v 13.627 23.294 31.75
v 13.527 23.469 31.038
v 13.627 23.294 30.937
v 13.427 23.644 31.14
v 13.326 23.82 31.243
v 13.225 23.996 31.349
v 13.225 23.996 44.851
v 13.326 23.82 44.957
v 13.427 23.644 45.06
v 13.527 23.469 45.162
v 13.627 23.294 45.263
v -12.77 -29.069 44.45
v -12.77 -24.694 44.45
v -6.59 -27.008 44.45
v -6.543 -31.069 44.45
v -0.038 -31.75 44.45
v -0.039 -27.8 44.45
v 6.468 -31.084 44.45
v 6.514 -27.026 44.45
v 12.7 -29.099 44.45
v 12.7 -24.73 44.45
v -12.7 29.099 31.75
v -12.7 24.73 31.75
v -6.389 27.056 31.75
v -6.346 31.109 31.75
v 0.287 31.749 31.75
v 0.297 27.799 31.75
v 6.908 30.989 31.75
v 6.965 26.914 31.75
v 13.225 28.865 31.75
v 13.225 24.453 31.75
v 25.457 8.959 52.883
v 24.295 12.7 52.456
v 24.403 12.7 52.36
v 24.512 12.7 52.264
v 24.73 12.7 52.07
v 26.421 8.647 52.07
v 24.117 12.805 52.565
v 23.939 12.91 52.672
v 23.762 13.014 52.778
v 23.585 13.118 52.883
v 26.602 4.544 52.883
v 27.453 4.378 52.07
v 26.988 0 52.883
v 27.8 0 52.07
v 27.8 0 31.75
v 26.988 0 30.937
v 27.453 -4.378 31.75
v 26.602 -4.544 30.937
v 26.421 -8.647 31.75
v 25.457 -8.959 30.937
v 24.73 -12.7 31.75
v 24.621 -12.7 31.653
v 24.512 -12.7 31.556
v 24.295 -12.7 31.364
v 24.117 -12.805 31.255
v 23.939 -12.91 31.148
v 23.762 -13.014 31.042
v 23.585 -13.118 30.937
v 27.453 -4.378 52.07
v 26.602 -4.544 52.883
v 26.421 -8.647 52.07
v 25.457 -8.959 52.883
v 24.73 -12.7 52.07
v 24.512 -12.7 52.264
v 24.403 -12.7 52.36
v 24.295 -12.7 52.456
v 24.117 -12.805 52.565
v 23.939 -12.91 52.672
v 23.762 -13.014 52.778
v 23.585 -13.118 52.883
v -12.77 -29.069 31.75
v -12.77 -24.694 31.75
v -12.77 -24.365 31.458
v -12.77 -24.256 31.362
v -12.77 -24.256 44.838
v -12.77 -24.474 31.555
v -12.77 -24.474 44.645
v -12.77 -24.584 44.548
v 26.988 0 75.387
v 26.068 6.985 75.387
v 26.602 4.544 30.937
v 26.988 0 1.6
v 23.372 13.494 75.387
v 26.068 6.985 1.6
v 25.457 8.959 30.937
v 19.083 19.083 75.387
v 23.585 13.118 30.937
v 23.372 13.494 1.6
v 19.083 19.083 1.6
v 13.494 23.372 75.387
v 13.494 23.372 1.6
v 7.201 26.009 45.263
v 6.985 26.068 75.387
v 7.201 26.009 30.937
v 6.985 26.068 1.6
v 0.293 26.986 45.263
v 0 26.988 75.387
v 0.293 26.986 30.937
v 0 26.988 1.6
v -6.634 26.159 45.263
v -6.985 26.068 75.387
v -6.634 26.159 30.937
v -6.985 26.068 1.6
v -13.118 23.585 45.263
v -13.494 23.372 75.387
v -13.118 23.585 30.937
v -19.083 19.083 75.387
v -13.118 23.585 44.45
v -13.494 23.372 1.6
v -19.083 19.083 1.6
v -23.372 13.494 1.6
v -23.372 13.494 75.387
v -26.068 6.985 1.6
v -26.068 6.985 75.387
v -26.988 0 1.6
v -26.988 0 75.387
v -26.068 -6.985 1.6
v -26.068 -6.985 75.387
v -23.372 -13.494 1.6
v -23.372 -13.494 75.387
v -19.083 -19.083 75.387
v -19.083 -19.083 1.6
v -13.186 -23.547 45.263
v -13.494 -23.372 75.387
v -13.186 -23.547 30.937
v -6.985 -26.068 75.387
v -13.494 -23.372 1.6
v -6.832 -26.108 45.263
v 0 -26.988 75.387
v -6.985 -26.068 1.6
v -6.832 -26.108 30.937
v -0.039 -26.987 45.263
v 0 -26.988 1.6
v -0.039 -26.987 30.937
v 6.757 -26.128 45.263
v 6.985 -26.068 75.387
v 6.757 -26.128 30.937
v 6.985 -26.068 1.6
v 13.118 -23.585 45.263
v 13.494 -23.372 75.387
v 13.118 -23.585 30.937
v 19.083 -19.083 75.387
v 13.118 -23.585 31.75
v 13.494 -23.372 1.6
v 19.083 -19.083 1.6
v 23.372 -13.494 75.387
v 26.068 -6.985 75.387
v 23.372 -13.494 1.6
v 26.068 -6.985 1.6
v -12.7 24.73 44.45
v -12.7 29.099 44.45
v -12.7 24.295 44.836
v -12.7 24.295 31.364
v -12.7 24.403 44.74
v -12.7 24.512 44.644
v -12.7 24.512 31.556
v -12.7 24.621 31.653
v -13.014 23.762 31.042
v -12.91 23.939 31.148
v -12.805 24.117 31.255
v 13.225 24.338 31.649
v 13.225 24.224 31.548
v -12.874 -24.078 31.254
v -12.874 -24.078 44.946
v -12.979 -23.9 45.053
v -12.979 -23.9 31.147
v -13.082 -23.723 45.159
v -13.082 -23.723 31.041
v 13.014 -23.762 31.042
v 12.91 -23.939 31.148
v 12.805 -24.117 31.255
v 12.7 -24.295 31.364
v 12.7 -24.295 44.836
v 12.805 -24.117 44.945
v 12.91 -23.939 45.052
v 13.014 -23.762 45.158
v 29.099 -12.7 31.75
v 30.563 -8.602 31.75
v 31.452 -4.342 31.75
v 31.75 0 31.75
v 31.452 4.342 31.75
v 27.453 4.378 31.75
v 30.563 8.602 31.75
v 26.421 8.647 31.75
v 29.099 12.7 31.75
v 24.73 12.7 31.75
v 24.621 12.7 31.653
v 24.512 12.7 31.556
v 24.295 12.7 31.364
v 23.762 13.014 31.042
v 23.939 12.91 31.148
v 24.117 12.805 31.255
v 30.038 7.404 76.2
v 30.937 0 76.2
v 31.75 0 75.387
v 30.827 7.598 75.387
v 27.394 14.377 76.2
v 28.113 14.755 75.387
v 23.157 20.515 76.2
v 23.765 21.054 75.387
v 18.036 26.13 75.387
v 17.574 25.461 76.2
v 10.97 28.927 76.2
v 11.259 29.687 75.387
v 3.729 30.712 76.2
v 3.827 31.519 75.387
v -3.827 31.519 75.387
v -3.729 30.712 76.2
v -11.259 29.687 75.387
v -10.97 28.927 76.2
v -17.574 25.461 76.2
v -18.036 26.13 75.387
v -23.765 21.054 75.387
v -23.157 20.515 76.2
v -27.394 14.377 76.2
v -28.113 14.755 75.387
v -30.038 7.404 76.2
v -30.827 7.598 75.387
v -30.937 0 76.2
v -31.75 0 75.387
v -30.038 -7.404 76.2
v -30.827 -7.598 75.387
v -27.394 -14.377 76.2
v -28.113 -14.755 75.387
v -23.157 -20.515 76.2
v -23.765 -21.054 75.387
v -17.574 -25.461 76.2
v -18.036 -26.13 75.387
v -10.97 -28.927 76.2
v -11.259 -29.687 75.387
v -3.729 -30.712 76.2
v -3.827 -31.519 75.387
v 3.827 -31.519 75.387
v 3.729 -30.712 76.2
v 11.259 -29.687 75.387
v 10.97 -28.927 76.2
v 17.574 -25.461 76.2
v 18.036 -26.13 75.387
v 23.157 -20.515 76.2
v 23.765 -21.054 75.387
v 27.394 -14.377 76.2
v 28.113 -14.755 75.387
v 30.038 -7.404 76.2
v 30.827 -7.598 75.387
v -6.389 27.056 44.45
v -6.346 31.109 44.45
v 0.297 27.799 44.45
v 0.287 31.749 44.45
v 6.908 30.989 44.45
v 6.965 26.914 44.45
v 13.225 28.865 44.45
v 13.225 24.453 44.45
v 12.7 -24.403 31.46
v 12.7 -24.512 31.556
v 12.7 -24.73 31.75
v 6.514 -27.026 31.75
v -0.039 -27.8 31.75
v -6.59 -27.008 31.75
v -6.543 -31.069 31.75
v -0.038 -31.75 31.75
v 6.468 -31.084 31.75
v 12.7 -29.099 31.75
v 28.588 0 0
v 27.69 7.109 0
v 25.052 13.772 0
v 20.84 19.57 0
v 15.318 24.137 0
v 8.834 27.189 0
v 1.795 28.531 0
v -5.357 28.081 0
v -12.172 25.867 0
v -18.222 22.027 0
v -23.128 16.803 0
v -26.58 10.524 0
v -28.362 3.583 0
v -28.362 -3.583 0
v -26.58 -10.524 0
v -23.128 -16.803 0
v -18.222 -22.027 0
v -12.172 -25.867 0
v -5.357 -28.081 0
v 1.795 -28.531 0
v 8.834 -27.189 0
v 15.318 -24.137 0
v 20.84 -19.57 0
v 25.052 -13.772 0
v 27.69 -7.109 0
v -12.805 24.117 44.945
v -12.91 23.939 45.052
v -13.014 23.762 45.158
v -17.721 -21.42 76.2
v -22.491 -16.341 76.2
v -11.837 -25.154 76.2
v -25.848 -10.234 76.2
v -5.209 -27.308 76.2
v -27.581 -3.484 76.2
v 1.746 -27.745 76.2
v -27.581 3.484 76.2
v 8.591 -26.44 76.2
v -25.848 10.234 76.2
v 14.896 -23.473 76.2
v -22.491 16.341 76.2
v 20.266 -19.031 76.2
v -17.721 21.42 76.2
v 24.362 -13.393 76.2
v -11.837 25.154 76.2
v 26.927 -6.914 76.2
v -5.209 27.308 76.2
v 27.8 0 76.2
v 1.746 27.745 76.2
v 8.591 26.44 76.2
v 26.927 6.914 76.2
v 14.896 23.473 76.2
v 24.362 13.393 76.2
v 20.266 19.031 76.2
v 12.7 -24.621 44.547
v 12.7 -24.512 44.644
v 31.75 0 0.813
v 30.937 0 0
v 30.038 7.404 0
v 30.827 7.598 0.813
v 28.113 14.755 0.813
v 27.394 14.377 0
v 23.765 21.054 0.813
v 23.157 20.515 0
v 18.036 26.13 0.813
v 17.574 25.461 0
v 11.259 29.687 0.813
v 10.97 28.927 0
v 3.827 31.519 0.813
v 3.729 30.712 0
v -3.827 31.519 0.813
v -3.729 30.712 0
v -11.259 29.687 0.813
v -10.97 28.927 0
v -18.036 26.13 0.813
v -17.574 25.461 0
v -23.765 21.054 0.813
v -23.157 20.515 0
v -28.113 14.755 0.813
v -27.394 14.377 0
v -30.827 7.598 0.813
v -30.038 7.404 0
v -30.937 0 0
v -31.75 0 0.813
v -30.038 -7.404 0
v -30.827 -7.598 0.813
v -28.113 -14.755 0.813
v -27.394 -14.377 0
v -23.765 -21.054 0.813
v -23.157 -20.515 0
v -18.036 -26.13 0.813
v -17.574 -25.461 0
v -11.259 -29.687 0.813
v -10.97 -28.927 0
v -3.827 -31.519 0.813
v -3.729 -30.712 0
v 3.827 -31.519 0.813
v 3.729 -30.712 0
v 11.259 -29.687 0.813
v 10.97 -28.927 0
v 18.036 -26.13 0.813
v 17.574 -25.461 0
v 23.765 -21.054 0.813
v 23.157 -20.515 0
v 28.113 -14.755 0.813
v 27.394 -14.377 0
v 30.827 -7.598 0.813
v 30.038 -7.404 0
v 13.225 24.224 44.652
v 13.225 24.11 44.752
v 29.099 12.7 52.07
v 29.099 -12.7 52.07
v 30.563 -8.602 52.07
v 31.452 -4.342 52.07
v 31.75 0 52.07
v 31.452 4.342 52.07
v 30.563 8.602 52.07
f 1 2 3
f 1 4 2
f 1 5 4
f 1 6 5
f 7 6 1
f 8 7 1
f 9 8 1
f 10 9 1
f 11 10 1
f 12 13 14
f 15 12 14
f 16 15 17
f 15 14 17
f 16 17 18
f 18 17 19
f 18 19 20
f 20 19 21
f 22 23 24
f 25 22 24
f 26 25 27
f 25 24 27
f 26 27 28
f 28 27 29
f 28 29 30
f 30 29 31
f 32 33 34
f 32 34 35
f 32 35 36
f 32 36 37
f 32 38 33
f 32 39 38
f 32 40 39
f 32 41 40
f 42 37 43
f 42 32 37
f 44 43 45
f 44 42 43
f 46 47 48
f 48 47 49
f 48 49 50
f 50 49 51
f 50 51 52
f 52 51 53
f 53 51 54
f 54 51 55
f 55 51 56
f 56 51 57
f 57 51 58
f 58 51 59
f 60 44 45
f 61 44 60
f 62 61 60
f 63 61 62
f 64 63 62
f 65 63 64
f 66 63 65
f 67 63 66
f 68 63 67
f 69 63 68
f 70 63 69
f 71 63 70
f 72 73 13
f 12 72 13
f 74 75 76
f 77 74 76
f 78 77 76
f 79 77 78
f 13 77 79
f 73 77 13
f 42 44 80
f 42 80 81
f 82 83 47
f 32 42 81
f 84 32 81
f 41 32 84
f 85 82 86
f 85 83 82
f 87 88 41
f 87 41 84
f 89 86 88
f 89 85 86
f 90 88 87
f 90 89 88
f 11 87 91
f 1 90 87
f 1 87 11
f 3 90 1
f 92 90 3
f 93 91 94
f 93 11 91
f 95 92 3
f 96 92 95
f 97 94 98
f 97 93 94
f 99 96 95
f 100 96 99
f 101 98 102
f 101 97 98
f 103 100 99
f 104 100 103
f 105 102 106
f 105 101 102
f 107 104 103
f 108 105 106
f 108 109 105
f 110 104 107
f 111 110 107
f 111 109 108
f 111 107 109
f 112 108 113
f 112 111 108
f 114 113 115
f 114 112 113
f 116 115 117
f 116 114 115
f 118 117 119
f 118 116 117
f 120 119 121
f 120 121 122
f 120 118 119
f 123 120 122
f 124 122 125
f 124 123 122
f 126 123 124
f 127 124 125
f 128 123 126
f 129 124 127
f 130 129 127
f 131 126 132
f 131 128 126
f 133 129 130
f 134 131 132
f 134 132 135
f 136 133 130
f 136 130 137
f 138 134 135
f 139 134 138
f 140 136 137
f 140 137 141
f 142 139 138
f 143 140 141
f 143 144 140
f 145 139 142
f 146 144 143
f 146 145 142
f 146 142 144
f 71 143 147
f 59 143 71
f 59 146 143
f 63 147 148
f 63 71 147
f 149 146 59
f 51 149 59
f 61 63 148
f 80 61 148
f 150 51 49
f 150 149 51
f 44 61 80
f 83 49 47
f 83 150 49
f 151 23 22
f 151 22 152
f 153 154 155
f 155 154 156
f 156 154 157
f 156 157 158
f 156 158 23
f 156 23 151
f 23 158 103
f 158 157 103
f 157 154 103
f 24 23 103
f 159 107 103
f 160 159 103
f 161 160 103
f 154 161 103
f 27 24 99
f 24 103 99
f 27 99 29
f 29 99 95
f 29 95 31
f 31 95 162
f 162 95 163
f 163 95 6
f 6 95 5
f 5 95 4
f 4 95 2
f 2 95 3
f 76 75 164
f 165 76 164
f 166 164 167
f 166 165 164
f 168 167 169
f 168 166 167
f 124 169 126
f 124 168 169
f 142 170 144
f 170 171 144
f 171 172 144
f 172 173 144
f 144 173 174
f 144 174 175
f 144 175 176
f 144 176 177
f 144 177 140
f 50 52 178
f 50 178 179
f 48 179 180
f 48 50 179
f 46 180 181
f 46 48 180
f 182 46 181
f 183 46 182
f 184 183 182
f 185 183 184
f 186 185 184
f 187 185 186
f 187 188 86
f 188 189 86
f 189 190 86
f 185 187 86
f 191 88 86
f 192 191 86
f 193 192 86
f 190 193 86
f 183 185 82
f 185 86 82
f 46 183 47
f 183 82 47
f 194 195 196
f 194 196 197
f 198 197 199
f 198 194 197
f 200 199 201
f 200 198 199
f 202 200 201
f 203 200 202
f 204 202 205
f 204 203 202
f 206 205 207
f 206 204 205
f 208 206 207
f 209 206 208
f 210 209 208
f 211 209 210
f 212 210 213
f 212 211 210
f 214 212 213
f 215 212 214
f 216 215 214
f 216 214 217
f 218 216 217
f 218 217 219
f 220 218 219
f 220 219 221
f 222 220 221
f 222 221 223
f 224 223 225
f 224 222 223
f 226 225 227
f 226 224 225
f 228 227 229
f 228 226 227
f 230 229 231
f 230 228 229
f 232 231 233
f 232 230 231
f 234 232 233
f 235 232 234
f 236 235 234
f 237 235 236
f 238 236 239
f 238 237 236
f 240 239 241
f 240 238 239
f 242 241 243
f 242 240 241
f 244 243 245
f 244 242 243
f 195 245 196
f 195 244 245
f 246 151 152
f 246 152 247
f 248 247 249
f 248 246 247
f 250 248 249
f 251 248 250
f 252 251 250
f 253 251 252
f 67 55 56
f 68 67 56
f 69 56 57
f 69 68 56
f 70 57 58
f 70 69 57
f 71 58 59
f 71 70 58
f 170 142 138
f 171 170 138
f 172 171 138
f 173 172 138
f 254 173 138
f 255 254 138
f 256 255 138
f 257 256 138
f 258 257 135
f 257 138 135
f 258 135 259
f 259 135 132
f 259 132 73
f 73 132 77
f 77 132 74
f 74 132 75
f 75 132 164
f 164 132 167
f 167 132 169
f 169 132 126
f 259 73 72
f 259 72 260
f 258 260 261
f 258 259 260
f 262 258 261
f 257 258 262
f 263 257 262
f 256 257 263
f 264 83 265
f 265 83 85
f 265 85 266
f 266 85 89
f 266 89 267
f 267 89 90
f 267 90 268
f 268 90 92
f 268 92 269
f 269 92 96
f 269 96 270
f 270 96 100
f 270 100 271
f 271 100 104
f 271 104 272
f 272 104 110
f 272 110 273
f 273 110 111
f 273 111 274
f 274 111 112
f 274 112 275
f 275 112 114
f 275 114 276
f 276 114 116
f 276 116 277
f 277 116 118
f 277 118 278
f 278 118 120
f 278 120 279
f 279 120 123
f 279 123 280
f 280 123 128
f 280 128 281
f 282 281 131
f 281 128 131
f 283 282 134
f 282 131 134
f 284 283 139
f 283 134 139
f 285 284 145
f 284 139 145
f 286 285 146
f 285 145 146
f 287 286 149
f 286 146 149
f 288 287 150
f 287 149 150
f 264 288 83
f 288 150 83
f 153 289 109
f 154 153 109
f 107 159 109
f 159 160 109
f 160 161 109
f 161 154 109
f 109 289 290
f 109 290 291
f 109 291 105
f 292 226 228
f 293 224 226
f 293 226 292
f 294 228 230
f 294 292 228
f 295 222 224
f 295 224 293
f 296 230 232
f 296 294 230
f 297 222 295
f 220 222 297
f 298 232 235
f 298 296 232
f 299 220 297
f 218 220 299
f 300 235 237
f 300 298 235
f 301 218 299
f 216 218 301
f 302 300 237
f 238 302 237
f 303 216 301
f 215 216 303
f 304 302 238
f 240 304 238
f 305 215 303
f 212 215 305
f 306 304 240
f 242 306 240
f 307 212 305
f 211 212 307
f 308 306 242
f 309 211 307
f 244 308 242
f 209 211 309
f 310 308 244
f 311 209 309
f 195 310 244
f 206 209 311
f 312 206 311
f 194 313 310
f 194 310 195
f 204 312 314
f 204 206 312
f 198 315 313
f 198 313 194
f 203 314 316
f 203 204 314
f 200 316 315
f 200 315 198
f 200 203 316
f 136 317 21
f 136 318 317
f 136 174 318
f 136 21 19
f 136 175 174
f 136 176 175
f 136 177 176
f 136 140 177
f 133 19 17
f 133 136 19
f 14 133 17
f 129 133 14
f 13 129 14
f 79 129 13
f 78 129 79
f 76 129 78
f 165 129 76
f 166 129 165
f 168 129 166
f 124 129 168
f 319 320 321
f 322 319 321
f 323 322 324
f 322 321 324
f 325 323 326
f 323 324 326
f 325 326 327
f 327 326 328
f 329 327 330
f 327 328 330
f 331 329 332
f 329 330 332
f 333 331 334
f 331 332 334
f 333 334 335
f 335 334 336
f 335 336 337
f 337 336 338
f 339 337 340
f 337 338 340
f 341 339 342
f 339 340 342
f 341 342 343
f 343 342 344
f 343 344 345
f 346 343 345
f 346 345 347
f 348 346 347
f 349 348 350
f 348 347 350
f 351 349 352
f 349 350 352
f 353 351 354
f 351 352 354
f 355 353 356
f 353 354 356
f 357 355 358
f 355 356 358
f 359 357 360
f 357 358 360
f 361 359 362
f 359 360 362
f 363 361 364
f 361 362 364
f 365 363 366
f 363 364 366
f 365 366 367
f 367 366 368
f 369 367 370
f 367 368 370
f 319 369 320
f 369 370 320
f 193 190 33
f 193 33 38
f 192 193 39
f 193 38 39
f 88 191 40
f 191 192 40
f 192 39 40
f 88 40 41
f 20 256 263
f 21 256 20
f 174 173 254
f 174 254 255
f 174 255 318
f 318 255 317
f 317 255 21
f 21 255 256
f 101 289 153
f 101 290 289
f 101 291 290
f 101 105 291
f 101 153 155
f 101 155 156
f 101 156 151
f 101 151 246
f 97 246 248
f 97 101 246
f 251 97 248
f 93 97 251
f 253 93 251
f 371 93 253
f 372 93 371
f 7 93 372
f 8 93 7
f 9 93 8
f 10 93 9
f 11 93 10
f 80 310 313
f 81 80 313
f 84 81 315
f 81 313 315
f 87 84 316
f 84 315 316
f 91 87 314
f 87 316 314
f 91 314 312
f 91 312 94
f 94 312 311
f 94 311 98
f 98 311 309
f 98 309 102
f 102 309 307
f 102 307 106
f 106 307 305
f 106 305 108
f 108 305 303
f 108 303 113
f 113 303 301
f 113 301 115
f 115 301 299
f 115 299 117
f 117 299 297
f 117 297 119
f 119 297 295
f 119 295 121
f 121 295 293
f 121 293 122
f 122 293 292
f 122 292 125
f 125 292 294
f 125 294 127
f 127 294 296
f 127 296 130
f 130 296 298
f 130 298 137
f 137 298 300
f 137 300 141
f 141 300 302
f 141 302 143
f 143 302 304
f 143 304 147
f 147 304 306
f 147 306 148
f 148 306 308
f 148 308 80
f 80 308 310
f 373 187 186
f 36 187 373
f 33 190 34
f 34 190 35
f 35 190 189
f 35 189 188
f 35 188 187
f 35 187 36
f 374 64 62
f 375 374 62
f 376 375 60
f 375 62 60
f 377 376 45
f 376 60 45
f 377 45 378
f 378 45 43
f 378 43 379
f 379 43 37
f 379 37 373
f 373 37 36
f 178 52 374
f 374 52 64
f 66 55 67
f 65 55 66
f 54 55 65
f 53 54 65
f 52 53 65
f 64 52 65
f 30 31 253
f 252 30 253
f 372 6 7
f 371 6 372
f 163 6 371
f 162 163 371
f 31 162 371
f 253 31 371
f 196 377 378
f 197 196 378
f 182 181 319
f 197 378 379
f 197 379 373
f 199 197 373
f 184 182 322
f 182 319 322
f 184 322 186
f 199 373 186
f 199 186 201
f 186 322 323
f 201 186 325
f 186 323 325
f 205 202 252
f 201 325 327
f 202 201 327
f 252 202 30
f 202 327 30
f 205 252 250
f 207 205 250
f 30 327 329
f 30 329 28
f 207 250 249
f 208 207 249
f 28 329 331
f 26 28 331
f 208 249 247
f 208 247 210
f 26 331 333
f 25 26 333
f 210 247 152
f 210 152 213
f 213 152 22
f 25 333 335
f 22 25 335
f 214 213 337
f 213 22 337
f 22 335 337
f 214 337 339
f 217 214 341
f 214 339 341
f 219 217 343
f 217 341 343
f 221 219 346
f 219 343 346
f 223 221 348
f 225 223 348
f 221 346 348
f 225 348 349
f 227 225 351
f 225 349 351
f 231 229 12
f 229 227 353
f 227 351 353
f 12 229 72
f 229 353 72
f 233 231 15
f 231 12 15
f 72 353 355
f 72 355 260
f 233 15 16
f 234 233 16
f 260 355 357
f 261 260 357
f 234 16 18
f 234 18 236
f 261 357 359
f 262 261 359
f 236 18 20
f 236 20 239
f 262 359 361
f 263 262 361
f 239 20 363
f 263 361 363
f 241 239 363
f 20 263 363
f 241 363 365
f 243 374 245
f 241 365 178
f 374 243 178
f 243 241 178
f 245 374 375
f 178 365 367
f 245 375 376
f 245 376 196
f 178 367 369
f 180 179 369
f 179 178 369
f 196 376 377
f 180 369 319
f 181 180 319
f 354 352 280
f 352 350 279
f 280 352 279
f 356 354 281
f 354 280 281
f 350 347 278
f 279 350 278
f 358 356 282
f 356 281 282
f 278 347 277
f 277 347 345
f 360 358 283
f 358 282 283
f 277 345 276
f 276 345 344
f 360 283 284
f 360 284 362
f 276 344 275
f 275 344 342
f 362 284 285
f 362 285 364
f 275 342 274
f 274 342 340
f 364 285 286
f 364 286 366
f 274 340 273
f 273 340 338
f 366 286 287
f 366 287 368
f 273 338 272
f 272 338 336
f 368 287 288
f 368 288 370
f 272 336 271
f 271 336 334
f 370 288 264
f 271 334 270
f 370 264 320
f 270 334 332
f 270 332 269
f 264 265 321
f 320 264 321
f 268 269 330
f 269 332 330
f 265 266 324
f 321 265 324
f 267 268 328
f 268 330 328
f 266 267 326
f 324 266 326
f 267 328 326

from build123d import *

# Parameters (mm, degrees)
F0_R          = 31.75
F0_R_2        = 26.9875
F1_DEPTH      = 76.2
F2_W          = 25.924757123
F2_H          = 12.7
F3_DEPTH      = 76.2
F4_W          = 25.4699392244
F4_H          = 12.7
F5_DEPTH      = 76.2
F6_W          = 25.4
F6_H          = 20.32
F7_DEPTH      = 76.2
F8_T1_DEPTH   = 20.32
F8_T3_DEPTH   = 12.7
F8_T8_ANGLE   = 32.5103926672
F8_T13_ANGLE  = 32.5103926672
F8_T18_ANGLE  = 32.5103926672
F8_T23_ANGLE  = 32.5103926672
F8_T28_ANGLE  = 66.292132353
F8_T34_ANGLE  = 66.292132353
F8_T40_ANGLE  = 65.190248715
F8_T46_ANGLE  = 65.190248715
F8_T53_ANGLE  = 32.5103926672
F8_T57_DEPTH  = 21.5976920802
F8_T64_ANGLE  = 32.5103926672
F8_T68_DEPTH  = 21.5976920802
F8_T75_ANGLE  = 32.5103926672
F8_T79_DEPTH  = 21.5976920802
F8_T86_DEPTH  = 21.5976920802
F8_T90_ANGLE  = 32.5103926672
F8_T97_ANGLE  = 66.292132353
F8_T101_DEPTH = 13.9481520643
F8_T108_ANGLE = 66.292132353
F8_T112_DEPTH = 13.9481520643
F8_T119_DEPTH = 13.9776920802
F8_T123_ANGLE = 66.292132353
F8_T130_DEPTH = 13.9776920802
F8_T134_ANGLE = 66.292132353
F8_T141_DEPTH = 13.9776920802
F8_T145_ANGLE = 65.190248715
F8_T152_DEPTH = 13.9776920802
F8_T156_ANGLE = 65.190248715
F8_T163_ANGLE = 65.190248715
F8_T167_DEPTH = 13.9737539479
F8_T174_ANGLE = 65.190248715
F8_T178_DEPTH = 13.9737539479
F9_SIZE       = 0.8128
F10_SIZE      = 1.6002


# Not quite as in the source:
# - a fillet or chamfer that OpenCascade refuses, or shapes differently, is made with other operations: its cross-section is extruded or revolved along the edge and cut away or added


with BuildPart() as f1:
    # F0 (on Top) → F1 (new body)
    with BuildSketch(Plane.XY):
        Circle(F0_R)
        Circle(F0_R_2, mode=Mode.SUBTRACT)
    extrude(amount=F1_DEPTH)

    # F2 (on Front) → F3 (cut)
    with BuildSketch(Plane.XZ):
        with Locations((0.2623785615, 38.1)):
            Rectangle(F2_W, F2_H)
    extrude(amount=-F3_DEPTH, mode=Mode.SUBTRACT)

    # F4 (on Front) → F5 (cut)
    with BuildSketch(Plane.XZ):
        with Locations((-0.0349696122, 38.1)):
            Rectangle(F4_W, F4_H)
    extrude(amount=F5_DEPTH, mode=Mode.SUBTRACT)

    # F6 (on Right) → F7 (cut)
    with BuildSketch(Plane.YZ):
        with Locations((0, 41.91)):
            Rectangle(F6_W, F6_H)
    extrude(amount=F7_DEPTH, mode=Mode.SUBTRACT)

    # F8: chamfer of 0.8128 on 14 edges, made by hand

    # F8_s2 → F8_t1 (cut)
    with BuildSketch(Plane.XY.offset(31.75)):
        with BuildLine():
            Line((24.2952858853, 12.7), (23.5849623144, 13.1177249886))
            ThreePointArc((23.5849623144, 13.1177249886), (23.6929781684, 12.9216075532), (23.8125, 12.7))
            Line((23.8125, 12.7), (24.2952858853, 12.7))
        make_face()
        with BuildLine():
            Line((24.2952858853, -12.7), (23.5849623144, -13.1177249886))
            ThreePointArc((23.5849623144, -13.1177249886), (23.6929781684, -12.9216075532), (23.8125, -12.7))
            Line((23.8125, -12.7), (24.2952858853, -12.7))
        make_face()
    extrude(amount=F8_T1_DEPTH, mode=Mode.SUBTRACT)

    # F8_s4 → F8_t3 (cut)
    with BuildSketch(Plane.XY.offset(31.75)):
        with BuildLine():
            Line((13.224757123, 23.9959094453), (13.6271397379, 23.2943387717))
            ThreePointArc((13.6271397379, 23.2943387717), (13.4386181576, 23.4036043862), (13.224757123, 23.5251132896))
            Line((13.224757123, 23.5251132896), (13.224757123, 23.9959094453))
        make_face()
        with BuildLine():
            Line((-12.7, 24.2952858853), (-13.1177249886, 23.5849623144))
            ThreePointArc((-13.1177249886, 23.5849623144), (-12.9216075532, 23.6929781684), (-12.7, 23.8125))
            Line((-12.7, 23.8125), (-12.7, 24.2952858853))
        make_face()
        with BuildLine():
            Line((12.7, -24.2952858853), (13.1177249886, -23.5849623144))
            ThreePointArc((13.1177249886, -23.5849623144), (12.9216075532, -23.6929781684), (12.7, -23.8125))
            Line((12.7, -23.8125), (12.7, -24.2952858853))
        make_face()
        with BuildLine():
            Line((-12.7699392244, -24.2562543533), (-13.1856193933, -23.547071951))
            ThreePointArc((-13.1856193933, -23.547071951), (-12.9905149919, -23.6552674154), (-12.7699392244, -23.7750669495))
            Line((-12.7699392244, -23.7750669495), (-12.7699392244, -24.2562543533))
        make_face()
    extrude(amount=F8_T3_DEPTH, mode=Mode.SUBTRACT)


with BuildPart() as f8_tool6:
    # F8_s7 → F8_t8 (revolve)
    with BuildSketch(Plane.XZ):
        Polygon((27.8003, 31.75), (26.9875, 30.9372), (26.9875, 31.75), align=None)
    revolve(axis=Axis((0, 0, 31.75), (0, 0, -1)), revolution_arc=F8_T8_ANGLE)

    split(bisect_by=Plane.XZ.offset(12.7), keep=Keep.BOTTOM)


with BuildPart() as f1_1:
    add(f1.part)

    # F8_t5: cut F8_tool6
    add(f8_tool6.part, mode=Mode.SUBTRACT)


with BuildPart() as f8_tool11:
    # F8_s12 → F8_t13 (revolve)
    with BuildSketch(Plane(origin=(0, 0, 0), x_dir=(0, 0, 1), z_dir=(-0.5374525791, 0.8432939732, 0))):
        Polygon((31.75, 27.8003), (30.9372, 26.9875), (31.75, 26.9875), align=None)
    revolve(axis=Axis((0, 0, 31.75), (0, 0, -1)), revolution_arc=F8_T13_ANGLE)

    split(bisect_by=Plane.XZ.offset(-12.7), keep=Keep.TOP)


with BuildPart() as f1_2:
    add(f1_1.part)

    # F8_t10: cut F8_tool11
    add(f8_tool11.part, mode=Mode.SUBTRACT)


with BuildPart() as f8_tool16:
    # F8_s17 → F8_t18 (revolve)
    with BuildSketch(Plane.XZ):
        Polygon((27.8003, 52.07), (26.9875, 52.8828), (26.9875, 52.07), align=None)
    revolve(axis=Axis((0, 0, 52.07), (0, 0, -1)), revolution_arc=F8_T18_ANGLE)

    split(bisect_by=Plane.XZ.offset(12.7), keep=Keep.BOTTOM)


with BuildPart() as f1_3:
    add(f1_2.part)

    # F8_t15: cut F8_tool16
    add(f8_tool16.part, mode=Mode.SUBTRACT)


with BuildPart() as f8_tool21:
    # F8_s22 → F8_t23 (revolve)
    with BuildSketch(Plane(origin=(0, 0, 0), x_dir=(0, 0, 1), z_dir=(-0.5374525791, 0.8432939732, 0))):
        Polygon((52.07, 27.8003), (52.8828, 26.9875), (52.07, 26.9875), align=None)
    revolve(axis=Axis((0, 0, 52.07), (0, 0, -1)), revolution_arc=F8_T23_ANGLE)

    split(bisect_by=Plane.XZ.offset(-12.7), keep=Keep.TOP)


with BuildPart() as f1_4:
    add(f1_3.part)

    # F8_t20: cut F8_tool21
    add(f8_tool21.part, mode=Mode.SUBTRACT)


with BuildPart() as f8_tool26:
    # F8_s27 → F8_t28 (revolve)
    with BuildSketch(Plane(origin=(0, 0, 0), x_dir=(0, 0, 1), z_dir=(-0.8432887953, -0.5374607034, 0))):
        Polygon((31.75, 27.8003), (30.9372, 26.9875), (31.75, 26.9875), align=None)
    revolve(axis=Axis((0, 0, 31.75), (0, 0, -1)), revolution_arc=F8_T28_ANGLE)

    split(bisect_by=Plane.YZ.offset(-12.7), keep=Keep.TOP)

    split(bisect_by=Plane.YZ.offset(13.224757123), keep=Keep.BOTTOM)


with BuildPart() as f1_5:
    add(f1_4.part)

    # F8_t25: cut F8_tool26
    add(f8_tool26.part, mode=Mode.SUBTRACT)


with BuildPart() as f8_tool32:
    # F8_s33 → F8_t34 (revolve)
    with BuildSketch(Plane(origin=(0, 0, 0), x_dir=(0, 0, 1), z_dir=(-0.8432887953, -0.5374607034, 0))):
        Polygon((44.45, 27.8003), (45.2628, 26.9875), (44.45, 26.9875), align=None)
    revolve(axis=Axis((0, 0, 44.45), (0, 0, -1)), revolution_arc=F8_T34_ANGLE)

    split(bisect_by=Plane.YZ.offset(-12.7), keep=Keep.TOP)

    split(bisect_by=Plane.YZ.offset(13.224757123), keep=Keep.BOTTOM)


with BuildPart() as f1_6:
    add(f1_5.part)

    # F8_t31: cut F8_tool32
    add(f8_tool32.part, mode=Mode.SUBTRACT)


with BuildPart() as f8_tool38:
    # F8_s39 → F8_t40 (revolve)
    with BuildSketch(Plane(origin=(0, 0, 0), x_dir=(0, 0, 1), z_dir=(0.843289054, 0.5374602975, 0))):
        Polygon((31.75, 27.8003), (30.9372, 26.9875), (31.75, 26.9875), align=None)
    revolve(axis=Axis((0, 0, 31.75), (0, 0, -1)), revolution_arc=F8_T40_ANGLE)

    split(bisect_by=Plane.YZ.offset(12.7), keep=Keep.BOTTOM)

    split(bisect_by=Plane.YZ.offset(-12.7699392244), keep=Keep.TOP)


with BuildPart() as f1_7:
    add(f1_6.part)

    # F8_t37: cut F8_tool38
    add(f8_tool38.part, mode=Mode.SUBTRACT)


with BuildPart() as f8_tool44:
    # F8_s45 → F8_t46 (revolve)
    with BuildSketch(Plane(origin=(0, 0, 0), x_dir=(0, 0, 1), z_dir=(0.843289054, 0.5374602975, 0))):
        Polygon((44.45, 27.8003), (45.2628, 26.9875), (44.45, 26.9875), align=None)
    revolve(axis=Axis((0, 0, 44.45), (0, 0, -1)), revolution_arc=F8_T46_ANGLE)

    split(bisect_by=Plane.YZ.offset(12.7), keep=Keep.BOTTOM)

    split(bisect_by=Plane.YZ.offset(-12.7699392244), keep=Keep.TOP)


with BuildPart() as f1_8:
    add(f1_7.part)

    # F8_t43: cut F8_tool44
    add(f8_tool44.part, mode=Mode.SUBTRACT)


with BuildPart() as f8_tool51:
    # F8_s52 → F8_t53 (revolve)
    with BuildSketch(Plane.XZ):
        Polygon((27.8003, 31.75), (26.9875, 30.9372), (26.9875, 31.75), align=None)
    revolve(axis=Axis((0, 0, 31.75), (0, 0, -1)), revolution_arc=F8_T53_ANGLE)

    split(bisect_by=Plane.XZ.offset(12.7), keep=Keep.TOP)


with BuildPart() as f8_tool55:
    # F8_s56 → F8_t57 (new body)
    with BuildSketch(Plane.XY.offset(52.07)):
        with BuildLine():
            Line((24.2952858853, -12.7), (23.5849623144, -13.1177249886))
            ThreePointArc((23.5849623144, -13.1177249886), (23.6929781684, -12.9216075532), (23.8125, -12.7))
            Line((23.8125, -12.7), (24.2952858853, -12.7))
        make_face()
    extrude(amount=-F8_T57_DEPTH)

    split(bisect_by=Plane.XY.offset(31.75), keep=Keep.BOTTOM)


with BuildPart() as f8_tool51_1:
    add(f8_tool51.part)

    # F8_t59: intersect F8_tool55
    add(f8_tool55.part, mode=Mode.INTERSECT)


with BuildPart() as f1_9:
    add(f1_8.part)

    # F8_t49: cut F8_tool51
    add(f8_tool51_1.part, mode=Mode.SUBTRACT)


with BuildPart() as f8_tool62:
    # F8_s63 → F8_t64 (revolve)
    with BuildSketch(Plane(origin=(0, 0, 0), x_dir=(0, 0, 1), z_dir=(-0.5374525791, 0.8432939732, 0))):
        Polygon((31.75, 27.8003), (30.9372, 26.9875), (31.75, 26.9875), align=None)
    revolve(axis=Axis((0, 0, 31.75), (0, 0, -1)), revolution_arc=F8_T64_ANGLE)

    split(bisect_by=Plane.XZ.offset(-12.7), keep=Keep.BOTTOM)


with BuildPart() as f8_tool66:
    # F8_s67 → F8_t68 (new body)
    with BuildSketch(Plane.XY.offset(52.07)):
        with BuildLine():
            Line((24.2952858853, 12.7), (23.5849623144, 13.1177249886))
            ThreePointArc((23.5849623144, 13.1177249886), (23.6929781684, 12.9216075532), (23.8125, 12.7))
            Line((23.8125, 12.7), (24.2952858853, 12.7))
        make_face()
    extrude(amount=-F8_T68_DEPTH)

    split(bisect_by=Plane.XY.offset(31.75), keep=Keep.BOTTOM)


with BuildPart() as f8_tool62_1:
    add(f8_tool62.part)

    # F8_t70: intersect F8_tool66
    add(f8_tool66.part, mode=Mode.INTERSECT)


with BuildPart() as f1_10:
    add(f1_9.part)

    # F8_t60: cut F8_tool62
    add(f8_tool62_1.part, mode=Mode.SUBTRACT)


with BuildPart() as f8_tool73:
    # F8_s74 → F8_t75 (revolve)
    with BuildSketch(Plane(origin=(0, 0, 0), x_dir=(0, 0, 1), z_dir=(-0.5374525791, 0.8432939732, 0))):
        Polygon((52.07, 27.8003), (52.8828, 26.9875), (52.07, 26.9875), align=None)
    revolve(axis=Axis((0, 0, 52.07), (0, 0, -1)), revolution_arc=F8_T75_ANGLE)

    split(bisect_by=Plane.XZ.offset(-12.7), keep=Keep.BOTTOM)


with BuildPart() as f8_tool77:
    # F8_s78 → F8_t79 (new body)
    with BuildSketch(Plane.XY.offset(53.3476920802)):
        with BuildLine():
            Line((24.2952858853, 12.7), (23.5849623144, 13.1177249886))
            ThreePointArc((23.5849623144, 13.1177249886), (23.6929781684, 12.9216075532), (23.8125, 12.7))
            Line((23.8125, 12.7), (24.2952858853, 12.7))
        make_face()
    extrude(amount=-F8_T79_DEPTH)

    split(bisect_by=Plane.XY.offset(52.07), keep=Keep.TOP)


with BuildPart() as f8_tool73_1:
    add(f8_tool73.part)

    # F8_t81: intersect F8_tool77
    add(f8_tool77.part, mode=Mode.INTERSECT)


with BuildPart() as f1_11:
    add(f1_10.part)

    # F8_t71: cut F8_tool73
    add(f8_tool73_1.part, mode=Mode.SUBTRACT)


with BuildPart() as f8_tool84:
    # F8_s85 → F8_t86 (new body)
    with BuildSketch(Plane.XY.offset(53.3476920802)):
        with BuildLine():
            Line((24.2952858853, -12.7), (23.5849623144, -13.1177249886))
            ThreePointArc((23.5849623144, -13.1177249886), (23.6929781684, -12.9216075532), (23.8125, -12.7))
            Line((23.8125, -12.7), (24.2952858853, -12.7))
        make_face()
    extrude(amount=-F8_T86_DEPTH)

    split(bisect_by=Plane.XY.offset(52.07), keep=Keep.TOP)


with BuildPart() as f8_tool88:
    # F8_s89 → F8_t90 (revolve)
    with BuildSketch(Plane.XZ):
        Polygon((27.8003, 52.07), (26.9875, 52.8828), (26.9875, 52.07), align=None)
    revolve(axis=Axis((0, 0, 52.07), (0, 0, -1)), revolution_arc=F8_T90_ANGLE)

    split(bisect_by=Plane.XZ.offset(12.7), keep=Keep.TOP)


with BuildPart() as f8_tool84_1:
    add(f8_tool84.part)

    # F8_t92: intersect F8_tool88
    add(f8_tool88.part, mode=Mode.INTERSECT)


with BuildPart() as f1_12:
    add(f1_11.part)

    # F8_t82: cut F8_tool84
    add(f8_tool84_1.part, mode=Mode.SUBTRACT)


with BuildPart() as f8_tool95:
    # F8_s96 → F8_t97 (revolve)
    with BuildSketch(Plane(origin=(0, 0, 0), x_dir=(0, 0, 1), z_dir=(-0.8432887953, -0.5374607034, 0))):
        Polygon((44.45, 27.8003), (45.2628, 26.9875), (44.45, 26.9875), align=None)
    revolve(axis=Axis((0, 0, 44.45), (0, 0, -1)), revolution_arc=F8_T97_ANGLE)

    split(bisect_by=Plane.YZ.offset(13.224757123), keep=Keep.TOP)


with BuildPart() as f8_tool99:
    # F8_s100 → F8_t101 (new body)
    with BuildSketch(Plane.XY.offset(45.6981520643)):
        with BuildLine():
            Line((13.224757123, 23.9959094453), (13.6271397379, 23.2943387717))
            ThreePointArc((13.6271397379, 23.2943387717), (13.4386181576, 23.4036043862), (13.224757123, 23.5251132896))
            Line((13.224757123, 23.5251132896), (13.224757123, 23.9959094453))
        make_face()
    extrude(amount=-F8_T101_DEPTH)

    split(bisect_by=Plane.XY.offset(44.45), keep=Keep.TOP)


with BuildPart() as f8_tool95_1:
    add(f8_tool95.part)

    # F8_t103: intersect F8_tool99
    add(f8_tool99.part, mode=Mode.INTERSECT)


with BuildPart() as f1_13:
    add(f1_12.part)

    # F8_t93: cut F8_tool95
    add(f8_tool95_1.part, mode=Mode.SUBTRACT)


with BuildPart() as f8_tool106:
    # F8_s107 → F8_t108 (revolve)
    with BuildSketch(Plane(origin=(0, 0, 0), x_dir=(0, 0, 1), z_dir=(-0.8432887953, -0.5374607034, 0))):
        Polygon((31.75, 27.8003), (30.9372, 26.9875), (31.75, 26.9875), align=None)
    revolve(axis=Axis((0, 0, 31.75), (0, 0, -1)), revolution_arc=F8_T108_ANGLE)

    split(bisect_by=Plane.YZ.offset(13.224757123), keep=Keep.TOP)


with BuildPart() as f8_tool110:
    # F8_s111 → F8_t112 (new body)
    with BuildSketch(Plane.XY.offset(44.45)):
        with BuildLine():
            Line((13.224757123, 23.9959094453), (13.6271397379, 23.2943387717))
            ThreePointArc((13.6271397379, 23.2943387717), (13.4386181576, 23.4036043862), (13.224757123, 23.5251132896))
            Line((13.224757123, 23.5251132896), (13.224757123, 23.9959094453))
        make_face()
    extrude(amount=-F8_T112_DEPTH)

    split(bisect_by=Plane.XY.offset(31.75), keep=Keep.BOTTOM)


with BuildPart() as f8_tool106_1:
    add(f8_tool106.part)

    # F8_t114: intersect F8_tool110
    add(f8_tool110.part, mode=Mode.INTERSECT)


with BuildPart() as f1_14:
    add(f1_13.part)

    # F8_t104: cut F8_tool106
    add(f8_tool106_1.part, mode=Mode.SUBTRACT)


with BuildPart() as f8_tool117:
    # F8_s118 → F8_t119 (new body)
    with BuildSketch(Plane.XY.offset(44.45)):
        with BuildLine():
            Line((-12.7, 24.2952858853), (-13.1177249886, 23.5849623144))
            ThreePointArc((-13.1177249886, 23.5849623144), (-12.9216075532, 23.6929781684), (-12.7, 23.8125))
            Line((-12.7, 23.8125), (-12.7, 24.2952858853))
        make_face()
    extrude(amount=-F8_T119_DEPTH)

    split(bisect_by=Plane.XY.offset(31.75), keep=Keep.BOTTOM)


with BuildPart() as f8_tool121:
    # F8_s122 → F8_t123 (revolve)
    with BuildSketch(Plane(origin=(0, 0, 0), x_dir=(0, 0, 1), z_dir=(-0.8432887953, -0.5374607034, 0))):
        Polygon((31.75, 27.8003), (30.9372, 26.9875), (31.75, 26.9875), align=None)
    revolve(axis=Axis((0, 0, 31.75), (0, 0, -1)), revolution_arc=F8_T123_ANGLE)

    split(bisect_by=Plane.YZ.offset(-12.7), keep=Keep.BOTTOM)


with BuildPart() as f8_tool117_1:
    add(f8_tool117.part)

    # F8_t125: intersect F8_tool121
    add(f8_tool121.part, mode=Mode.INTERSECT)


with BuildPart() as f1_15:
    add(f1_14.part)

    # F8_t115: cut F8_tool117
    add(f8_tool117_1.part, mode=Mode.SUBTRACT)


with BuildPart() as f8_tool128:
    # F8_s129 → F8_t130 (new body)
    with BuildSketch(Plane.XY.offset(45.7276920802)):
        with BuildLine():
            Line((-12.7, 24.2952858853), (-13.1177249886, 23.5849623144))
            ThreePointArc((-13.1177249886, 23.5849623144), (-12.9216075532, 23.6929781684), (-12.7, 23.8125))
            Line((-12.7, 23.8125), (-12.7, 24.2952858853))
        make_face()
    extrude(amount=-F8_T130_DEPTH)

    split(bisect_by=Plane.XY.offset(44.45), keep=Keep.TOP)


with BuildPart() as f8_tool132:
    # F8_s133 → F8_t134 (revolve)
    with BuildSketch(Plane(origin=(0, 0, 0), x_dir=(0, 0, 1), z_dir=(-0.8432887953, -0.5374607034, 0))):
        Polygon((44.45, 27.8003), (45.2628, 26.9875), (44.45, 26.9875), align=None)
    revolve(axis=Axis((0, 0, 44.45), (0, 0, -1)), revolution_arc=F8_T134_ANGLE)

    split(bisect_by=Plane.YZ.offset(-12.7), keep=Keep.BOTTOM)


with BuildPart() as f8_tool128_1:
    add(f8_tool128.part)

    # F8_t136: intersect F8_tool132
    add(f8_tool132.part, mode=Mode.INTERSECT)


with BuildPart() as f1_16:
    add(f1_15.part)

    # F8_t126: cut F8_tool128
    add(f8_tool128_1.part, mode=Mode.SUBTRACT)


with BuildPart() as f8_tool139:
    # F8_s140 → F8_t141 (new body)
    with BuildSketch(Plane.XY.offset(45.7276920802)):
        with BuildLine():
            Line((12.7, -24.2952858853), (13.1177249886, -23.5849623144))
            ThreePointArc((13.1177249886, -23.5849623144), (12.9216075532, -23.6929781684), (12.7, -23.8125))
            Line((12.7, -23.8125), (12.7, -24.2952858853))
        make_face()
    extrude(amount=-F8_T141_DEPTH)

    split(bisect_by=Plane.XY.offset(44.45), keep=Keep.TOP)


with BuildPart() as f8_tool143:
    # F8_s144 → F8_t145 (revolve)
    with BuildSketch(Plane(origin=(0, 0, 0), x_dir=(0, 0, 1), z_dir=(0.843289054, 0.5374602975, 0))):
        Polygon((44.45, 27.8003), (45.2628, 26.9875), (44.45, 26.9875), align=None)
    revolve(axis=Axis((0, 0, 44.45), (0, 0, -1)), revolution_arc=F8_T145_ANGLE)

    split(bisect_by=Plane.YZ.offset(12.7), keep=Keep.TOP)


with BuildPart() as f8_tool139_1:
    add(f8_tool139.part)

    # F8_t147: intersect F8_tool143
    add(f8_tool143.part, mode=Mode.INTERSECT)


with BuildPart() as f1_17:
    add(f1_16.part)

    # F8_t137: cut F8_tool139
    add(f8_tool139_1.part, mode=Mode.SUBTRACT)


with BuildPart() as f8_tool150:
    # F8_s151 → F8_t152 (new body)
    with BuildSketch(Plane.XY.offset(44.45)):
        with BuildLine():
            Line((12.7, -24.2952858853), (13.1177249886, -23.5849623144))
            ThreePointArc((13.1177249886, -23.5849623144), (12.9216075532, -23.6929781684), (12.7, -23.8125))
            Line((12.7, -23.8125), (12.7, -24.2952858853))
        make_face()
    extrude(amount=-F8_T152_DEPTH)

    split(bisect_by=Plane.XY.offset(31.75), keep=Keep.BOTTOM)


with BuildPart() as f8_tool154:
    # F8_s155 → F8_t156 (revolve)
    with BuildSketch(Plane(origin=(0, 0, 0), x_dir=(0, 0, 1), z_dir=(0.843289054, 0.5374602975, 0))):
        Polygon((31.75, 27.8003), (30.9372, 26.9875), (31.75, 26.9875), align=None)
    revolve(axis=Axis((0, 0, 31.75), (0, 0, -1)), revolution_arc=F8_T156_ANGLE)

    split(bisect_by=Plane.YZ.offset(12.7), keep=Keep.TOP)


with BuildPart() as f8_tool150_1:
    add(f8_tool150.part)

    # F8_t158: intersect F8_tool154
    add(f8_tool154.part, mode=Mode.INTERSECT)


with BuildPart() as f1_18:
    add(f1_17.part)

    # F8_t148: cut F8_tool150
    add(f8_tool150_1.part, mode=Mode.SUBTRACT)


with BuildPart() as f8_tool161:
    # F8_s162 → F8_t163 (revolve)
    with BuildSketch(Plane(origin=(0, 0, 0), x_dir=(0, 0, 1), z_dir=(0.843289054, 0.5374602975, 0))):
        Polygon((44.45, 27.8003), (45.2628, 26.9875), (44.45, 26.9875), align=None)
    revolve(axis=Axis((0, 0, 44.45), (0, 0, -1)), revolution_arc=F8_T163_ANGLE)

    split(bisect_by=Plane.YZ.offset(-12.7699392244), keep=Keep.BOTTOM)


with BuildPart() as f8_tool165:
    # F8_s166 → F8_t167 (new body)
    with BuildSketch(Plane.XY.offset(45.7237539479)):
        with BuildLine():
            Line((-12.7699392244, -24.2562543533), (-13.1856193933, -23.547071951))
            ThreePointArc((-13.1856193933, -23.547071951), (-12.9905149919, -23.6552674154), (-12.7699392244, -23.7750669495))
            Line((-12.7699392244, -23.7750669495), (-12.7699392244, -24.2562543533))
        make_face()
    extrude(amount=-F8_T167_DEPTH)

    split(bisect_by=Plane.XY.offset(44.45), keep=Keep.TOP)


with BuildPart() as f8_tool161_1:
    add(f8_tool161.part)

    # F8_t169: intersect F8_tool165
    add(f8_tool165.part, mode=Mode.INTERSECT)


with BuildPart() as f1_19:
    add(f1_18.part)

    # F8_t159: cut F8_tool161
    add(f8_tool161_1.part, mode=Mode.SUBTRACT)


with BuildPart() as f8_tool172:
    # F8_s173 → F8_t174 (revolve)
    with BuildSketch(Plane(origin=(0, 0, 0), x_dir=(0, 0, 1), z_dir=(0.843289054, 0.5374602975, 0))):
        Polygon((31.75, 27.8003), (30.9372, 26.9875), (31.75, 26.9875), align=None)
    revolve(axis=Axis((0, 0, 31.75), (0, 0, -1)), revolution_arc=F8_T174_ANGLE)

    split(bisect_by=Plane.YZ.offset(-12.7699392244), keep=Keep.BOTTOM)


with BuildPart() as f8_tool176:
    # F8_s177 → F8_t178 (new body)
    with BuildSketch(Plane.XY.offset(44.45)):
        with BuildLine():
            Line((-12.7699392244, -24.2562543533), (-13.1856193933, -23.547071951))
            ThreePointArc((-13.1856193933, -23.547071951), (-12.9905149919, -23.6552674154), (-12.7699392244, -23.7750669495))
            Line((-12.7699392244, -23.7750669495), (-12.7699392244, -24.2562543533))
        make_face()
    extrude(amount=-F8_T178_DEPTH)

    split(bisect_by=Plane.XY.offset(31.75), keep=Keep.BOTTOM)


with BuildPart() as f8_tool172_1:
    add(f8_tool172.part)

    # F8_t180: intersect F8_tool176
    add(f8_tool176.part, mode=Mode.INTERSECT)


with BuildPart() as f1_20:
    add(f1_19.part)

    # F8_t170: cut F8_tool172
    add(f8_tool172_1.part, mode=Mode.SUBTRACT)

    # F9
    f9_edges = [f1_20.edges().sort_by_distance(p)[0] for p in [
        (-26.9875, 0, 76.2),
        (-31.75, 0, 76.2),
        (-31.75, 0, 0),
    ]]
    chamfer(f9_edges, length=F9_SIZE)

    # F10
    f10_edges = [f1_20.edges().sort_by_distance(p)[0] for p in [
        (-26.9875, 0, 0),
    ]]
    chamfer(f10_edges, length=F10_SIZE)


solid = f1_20.part
